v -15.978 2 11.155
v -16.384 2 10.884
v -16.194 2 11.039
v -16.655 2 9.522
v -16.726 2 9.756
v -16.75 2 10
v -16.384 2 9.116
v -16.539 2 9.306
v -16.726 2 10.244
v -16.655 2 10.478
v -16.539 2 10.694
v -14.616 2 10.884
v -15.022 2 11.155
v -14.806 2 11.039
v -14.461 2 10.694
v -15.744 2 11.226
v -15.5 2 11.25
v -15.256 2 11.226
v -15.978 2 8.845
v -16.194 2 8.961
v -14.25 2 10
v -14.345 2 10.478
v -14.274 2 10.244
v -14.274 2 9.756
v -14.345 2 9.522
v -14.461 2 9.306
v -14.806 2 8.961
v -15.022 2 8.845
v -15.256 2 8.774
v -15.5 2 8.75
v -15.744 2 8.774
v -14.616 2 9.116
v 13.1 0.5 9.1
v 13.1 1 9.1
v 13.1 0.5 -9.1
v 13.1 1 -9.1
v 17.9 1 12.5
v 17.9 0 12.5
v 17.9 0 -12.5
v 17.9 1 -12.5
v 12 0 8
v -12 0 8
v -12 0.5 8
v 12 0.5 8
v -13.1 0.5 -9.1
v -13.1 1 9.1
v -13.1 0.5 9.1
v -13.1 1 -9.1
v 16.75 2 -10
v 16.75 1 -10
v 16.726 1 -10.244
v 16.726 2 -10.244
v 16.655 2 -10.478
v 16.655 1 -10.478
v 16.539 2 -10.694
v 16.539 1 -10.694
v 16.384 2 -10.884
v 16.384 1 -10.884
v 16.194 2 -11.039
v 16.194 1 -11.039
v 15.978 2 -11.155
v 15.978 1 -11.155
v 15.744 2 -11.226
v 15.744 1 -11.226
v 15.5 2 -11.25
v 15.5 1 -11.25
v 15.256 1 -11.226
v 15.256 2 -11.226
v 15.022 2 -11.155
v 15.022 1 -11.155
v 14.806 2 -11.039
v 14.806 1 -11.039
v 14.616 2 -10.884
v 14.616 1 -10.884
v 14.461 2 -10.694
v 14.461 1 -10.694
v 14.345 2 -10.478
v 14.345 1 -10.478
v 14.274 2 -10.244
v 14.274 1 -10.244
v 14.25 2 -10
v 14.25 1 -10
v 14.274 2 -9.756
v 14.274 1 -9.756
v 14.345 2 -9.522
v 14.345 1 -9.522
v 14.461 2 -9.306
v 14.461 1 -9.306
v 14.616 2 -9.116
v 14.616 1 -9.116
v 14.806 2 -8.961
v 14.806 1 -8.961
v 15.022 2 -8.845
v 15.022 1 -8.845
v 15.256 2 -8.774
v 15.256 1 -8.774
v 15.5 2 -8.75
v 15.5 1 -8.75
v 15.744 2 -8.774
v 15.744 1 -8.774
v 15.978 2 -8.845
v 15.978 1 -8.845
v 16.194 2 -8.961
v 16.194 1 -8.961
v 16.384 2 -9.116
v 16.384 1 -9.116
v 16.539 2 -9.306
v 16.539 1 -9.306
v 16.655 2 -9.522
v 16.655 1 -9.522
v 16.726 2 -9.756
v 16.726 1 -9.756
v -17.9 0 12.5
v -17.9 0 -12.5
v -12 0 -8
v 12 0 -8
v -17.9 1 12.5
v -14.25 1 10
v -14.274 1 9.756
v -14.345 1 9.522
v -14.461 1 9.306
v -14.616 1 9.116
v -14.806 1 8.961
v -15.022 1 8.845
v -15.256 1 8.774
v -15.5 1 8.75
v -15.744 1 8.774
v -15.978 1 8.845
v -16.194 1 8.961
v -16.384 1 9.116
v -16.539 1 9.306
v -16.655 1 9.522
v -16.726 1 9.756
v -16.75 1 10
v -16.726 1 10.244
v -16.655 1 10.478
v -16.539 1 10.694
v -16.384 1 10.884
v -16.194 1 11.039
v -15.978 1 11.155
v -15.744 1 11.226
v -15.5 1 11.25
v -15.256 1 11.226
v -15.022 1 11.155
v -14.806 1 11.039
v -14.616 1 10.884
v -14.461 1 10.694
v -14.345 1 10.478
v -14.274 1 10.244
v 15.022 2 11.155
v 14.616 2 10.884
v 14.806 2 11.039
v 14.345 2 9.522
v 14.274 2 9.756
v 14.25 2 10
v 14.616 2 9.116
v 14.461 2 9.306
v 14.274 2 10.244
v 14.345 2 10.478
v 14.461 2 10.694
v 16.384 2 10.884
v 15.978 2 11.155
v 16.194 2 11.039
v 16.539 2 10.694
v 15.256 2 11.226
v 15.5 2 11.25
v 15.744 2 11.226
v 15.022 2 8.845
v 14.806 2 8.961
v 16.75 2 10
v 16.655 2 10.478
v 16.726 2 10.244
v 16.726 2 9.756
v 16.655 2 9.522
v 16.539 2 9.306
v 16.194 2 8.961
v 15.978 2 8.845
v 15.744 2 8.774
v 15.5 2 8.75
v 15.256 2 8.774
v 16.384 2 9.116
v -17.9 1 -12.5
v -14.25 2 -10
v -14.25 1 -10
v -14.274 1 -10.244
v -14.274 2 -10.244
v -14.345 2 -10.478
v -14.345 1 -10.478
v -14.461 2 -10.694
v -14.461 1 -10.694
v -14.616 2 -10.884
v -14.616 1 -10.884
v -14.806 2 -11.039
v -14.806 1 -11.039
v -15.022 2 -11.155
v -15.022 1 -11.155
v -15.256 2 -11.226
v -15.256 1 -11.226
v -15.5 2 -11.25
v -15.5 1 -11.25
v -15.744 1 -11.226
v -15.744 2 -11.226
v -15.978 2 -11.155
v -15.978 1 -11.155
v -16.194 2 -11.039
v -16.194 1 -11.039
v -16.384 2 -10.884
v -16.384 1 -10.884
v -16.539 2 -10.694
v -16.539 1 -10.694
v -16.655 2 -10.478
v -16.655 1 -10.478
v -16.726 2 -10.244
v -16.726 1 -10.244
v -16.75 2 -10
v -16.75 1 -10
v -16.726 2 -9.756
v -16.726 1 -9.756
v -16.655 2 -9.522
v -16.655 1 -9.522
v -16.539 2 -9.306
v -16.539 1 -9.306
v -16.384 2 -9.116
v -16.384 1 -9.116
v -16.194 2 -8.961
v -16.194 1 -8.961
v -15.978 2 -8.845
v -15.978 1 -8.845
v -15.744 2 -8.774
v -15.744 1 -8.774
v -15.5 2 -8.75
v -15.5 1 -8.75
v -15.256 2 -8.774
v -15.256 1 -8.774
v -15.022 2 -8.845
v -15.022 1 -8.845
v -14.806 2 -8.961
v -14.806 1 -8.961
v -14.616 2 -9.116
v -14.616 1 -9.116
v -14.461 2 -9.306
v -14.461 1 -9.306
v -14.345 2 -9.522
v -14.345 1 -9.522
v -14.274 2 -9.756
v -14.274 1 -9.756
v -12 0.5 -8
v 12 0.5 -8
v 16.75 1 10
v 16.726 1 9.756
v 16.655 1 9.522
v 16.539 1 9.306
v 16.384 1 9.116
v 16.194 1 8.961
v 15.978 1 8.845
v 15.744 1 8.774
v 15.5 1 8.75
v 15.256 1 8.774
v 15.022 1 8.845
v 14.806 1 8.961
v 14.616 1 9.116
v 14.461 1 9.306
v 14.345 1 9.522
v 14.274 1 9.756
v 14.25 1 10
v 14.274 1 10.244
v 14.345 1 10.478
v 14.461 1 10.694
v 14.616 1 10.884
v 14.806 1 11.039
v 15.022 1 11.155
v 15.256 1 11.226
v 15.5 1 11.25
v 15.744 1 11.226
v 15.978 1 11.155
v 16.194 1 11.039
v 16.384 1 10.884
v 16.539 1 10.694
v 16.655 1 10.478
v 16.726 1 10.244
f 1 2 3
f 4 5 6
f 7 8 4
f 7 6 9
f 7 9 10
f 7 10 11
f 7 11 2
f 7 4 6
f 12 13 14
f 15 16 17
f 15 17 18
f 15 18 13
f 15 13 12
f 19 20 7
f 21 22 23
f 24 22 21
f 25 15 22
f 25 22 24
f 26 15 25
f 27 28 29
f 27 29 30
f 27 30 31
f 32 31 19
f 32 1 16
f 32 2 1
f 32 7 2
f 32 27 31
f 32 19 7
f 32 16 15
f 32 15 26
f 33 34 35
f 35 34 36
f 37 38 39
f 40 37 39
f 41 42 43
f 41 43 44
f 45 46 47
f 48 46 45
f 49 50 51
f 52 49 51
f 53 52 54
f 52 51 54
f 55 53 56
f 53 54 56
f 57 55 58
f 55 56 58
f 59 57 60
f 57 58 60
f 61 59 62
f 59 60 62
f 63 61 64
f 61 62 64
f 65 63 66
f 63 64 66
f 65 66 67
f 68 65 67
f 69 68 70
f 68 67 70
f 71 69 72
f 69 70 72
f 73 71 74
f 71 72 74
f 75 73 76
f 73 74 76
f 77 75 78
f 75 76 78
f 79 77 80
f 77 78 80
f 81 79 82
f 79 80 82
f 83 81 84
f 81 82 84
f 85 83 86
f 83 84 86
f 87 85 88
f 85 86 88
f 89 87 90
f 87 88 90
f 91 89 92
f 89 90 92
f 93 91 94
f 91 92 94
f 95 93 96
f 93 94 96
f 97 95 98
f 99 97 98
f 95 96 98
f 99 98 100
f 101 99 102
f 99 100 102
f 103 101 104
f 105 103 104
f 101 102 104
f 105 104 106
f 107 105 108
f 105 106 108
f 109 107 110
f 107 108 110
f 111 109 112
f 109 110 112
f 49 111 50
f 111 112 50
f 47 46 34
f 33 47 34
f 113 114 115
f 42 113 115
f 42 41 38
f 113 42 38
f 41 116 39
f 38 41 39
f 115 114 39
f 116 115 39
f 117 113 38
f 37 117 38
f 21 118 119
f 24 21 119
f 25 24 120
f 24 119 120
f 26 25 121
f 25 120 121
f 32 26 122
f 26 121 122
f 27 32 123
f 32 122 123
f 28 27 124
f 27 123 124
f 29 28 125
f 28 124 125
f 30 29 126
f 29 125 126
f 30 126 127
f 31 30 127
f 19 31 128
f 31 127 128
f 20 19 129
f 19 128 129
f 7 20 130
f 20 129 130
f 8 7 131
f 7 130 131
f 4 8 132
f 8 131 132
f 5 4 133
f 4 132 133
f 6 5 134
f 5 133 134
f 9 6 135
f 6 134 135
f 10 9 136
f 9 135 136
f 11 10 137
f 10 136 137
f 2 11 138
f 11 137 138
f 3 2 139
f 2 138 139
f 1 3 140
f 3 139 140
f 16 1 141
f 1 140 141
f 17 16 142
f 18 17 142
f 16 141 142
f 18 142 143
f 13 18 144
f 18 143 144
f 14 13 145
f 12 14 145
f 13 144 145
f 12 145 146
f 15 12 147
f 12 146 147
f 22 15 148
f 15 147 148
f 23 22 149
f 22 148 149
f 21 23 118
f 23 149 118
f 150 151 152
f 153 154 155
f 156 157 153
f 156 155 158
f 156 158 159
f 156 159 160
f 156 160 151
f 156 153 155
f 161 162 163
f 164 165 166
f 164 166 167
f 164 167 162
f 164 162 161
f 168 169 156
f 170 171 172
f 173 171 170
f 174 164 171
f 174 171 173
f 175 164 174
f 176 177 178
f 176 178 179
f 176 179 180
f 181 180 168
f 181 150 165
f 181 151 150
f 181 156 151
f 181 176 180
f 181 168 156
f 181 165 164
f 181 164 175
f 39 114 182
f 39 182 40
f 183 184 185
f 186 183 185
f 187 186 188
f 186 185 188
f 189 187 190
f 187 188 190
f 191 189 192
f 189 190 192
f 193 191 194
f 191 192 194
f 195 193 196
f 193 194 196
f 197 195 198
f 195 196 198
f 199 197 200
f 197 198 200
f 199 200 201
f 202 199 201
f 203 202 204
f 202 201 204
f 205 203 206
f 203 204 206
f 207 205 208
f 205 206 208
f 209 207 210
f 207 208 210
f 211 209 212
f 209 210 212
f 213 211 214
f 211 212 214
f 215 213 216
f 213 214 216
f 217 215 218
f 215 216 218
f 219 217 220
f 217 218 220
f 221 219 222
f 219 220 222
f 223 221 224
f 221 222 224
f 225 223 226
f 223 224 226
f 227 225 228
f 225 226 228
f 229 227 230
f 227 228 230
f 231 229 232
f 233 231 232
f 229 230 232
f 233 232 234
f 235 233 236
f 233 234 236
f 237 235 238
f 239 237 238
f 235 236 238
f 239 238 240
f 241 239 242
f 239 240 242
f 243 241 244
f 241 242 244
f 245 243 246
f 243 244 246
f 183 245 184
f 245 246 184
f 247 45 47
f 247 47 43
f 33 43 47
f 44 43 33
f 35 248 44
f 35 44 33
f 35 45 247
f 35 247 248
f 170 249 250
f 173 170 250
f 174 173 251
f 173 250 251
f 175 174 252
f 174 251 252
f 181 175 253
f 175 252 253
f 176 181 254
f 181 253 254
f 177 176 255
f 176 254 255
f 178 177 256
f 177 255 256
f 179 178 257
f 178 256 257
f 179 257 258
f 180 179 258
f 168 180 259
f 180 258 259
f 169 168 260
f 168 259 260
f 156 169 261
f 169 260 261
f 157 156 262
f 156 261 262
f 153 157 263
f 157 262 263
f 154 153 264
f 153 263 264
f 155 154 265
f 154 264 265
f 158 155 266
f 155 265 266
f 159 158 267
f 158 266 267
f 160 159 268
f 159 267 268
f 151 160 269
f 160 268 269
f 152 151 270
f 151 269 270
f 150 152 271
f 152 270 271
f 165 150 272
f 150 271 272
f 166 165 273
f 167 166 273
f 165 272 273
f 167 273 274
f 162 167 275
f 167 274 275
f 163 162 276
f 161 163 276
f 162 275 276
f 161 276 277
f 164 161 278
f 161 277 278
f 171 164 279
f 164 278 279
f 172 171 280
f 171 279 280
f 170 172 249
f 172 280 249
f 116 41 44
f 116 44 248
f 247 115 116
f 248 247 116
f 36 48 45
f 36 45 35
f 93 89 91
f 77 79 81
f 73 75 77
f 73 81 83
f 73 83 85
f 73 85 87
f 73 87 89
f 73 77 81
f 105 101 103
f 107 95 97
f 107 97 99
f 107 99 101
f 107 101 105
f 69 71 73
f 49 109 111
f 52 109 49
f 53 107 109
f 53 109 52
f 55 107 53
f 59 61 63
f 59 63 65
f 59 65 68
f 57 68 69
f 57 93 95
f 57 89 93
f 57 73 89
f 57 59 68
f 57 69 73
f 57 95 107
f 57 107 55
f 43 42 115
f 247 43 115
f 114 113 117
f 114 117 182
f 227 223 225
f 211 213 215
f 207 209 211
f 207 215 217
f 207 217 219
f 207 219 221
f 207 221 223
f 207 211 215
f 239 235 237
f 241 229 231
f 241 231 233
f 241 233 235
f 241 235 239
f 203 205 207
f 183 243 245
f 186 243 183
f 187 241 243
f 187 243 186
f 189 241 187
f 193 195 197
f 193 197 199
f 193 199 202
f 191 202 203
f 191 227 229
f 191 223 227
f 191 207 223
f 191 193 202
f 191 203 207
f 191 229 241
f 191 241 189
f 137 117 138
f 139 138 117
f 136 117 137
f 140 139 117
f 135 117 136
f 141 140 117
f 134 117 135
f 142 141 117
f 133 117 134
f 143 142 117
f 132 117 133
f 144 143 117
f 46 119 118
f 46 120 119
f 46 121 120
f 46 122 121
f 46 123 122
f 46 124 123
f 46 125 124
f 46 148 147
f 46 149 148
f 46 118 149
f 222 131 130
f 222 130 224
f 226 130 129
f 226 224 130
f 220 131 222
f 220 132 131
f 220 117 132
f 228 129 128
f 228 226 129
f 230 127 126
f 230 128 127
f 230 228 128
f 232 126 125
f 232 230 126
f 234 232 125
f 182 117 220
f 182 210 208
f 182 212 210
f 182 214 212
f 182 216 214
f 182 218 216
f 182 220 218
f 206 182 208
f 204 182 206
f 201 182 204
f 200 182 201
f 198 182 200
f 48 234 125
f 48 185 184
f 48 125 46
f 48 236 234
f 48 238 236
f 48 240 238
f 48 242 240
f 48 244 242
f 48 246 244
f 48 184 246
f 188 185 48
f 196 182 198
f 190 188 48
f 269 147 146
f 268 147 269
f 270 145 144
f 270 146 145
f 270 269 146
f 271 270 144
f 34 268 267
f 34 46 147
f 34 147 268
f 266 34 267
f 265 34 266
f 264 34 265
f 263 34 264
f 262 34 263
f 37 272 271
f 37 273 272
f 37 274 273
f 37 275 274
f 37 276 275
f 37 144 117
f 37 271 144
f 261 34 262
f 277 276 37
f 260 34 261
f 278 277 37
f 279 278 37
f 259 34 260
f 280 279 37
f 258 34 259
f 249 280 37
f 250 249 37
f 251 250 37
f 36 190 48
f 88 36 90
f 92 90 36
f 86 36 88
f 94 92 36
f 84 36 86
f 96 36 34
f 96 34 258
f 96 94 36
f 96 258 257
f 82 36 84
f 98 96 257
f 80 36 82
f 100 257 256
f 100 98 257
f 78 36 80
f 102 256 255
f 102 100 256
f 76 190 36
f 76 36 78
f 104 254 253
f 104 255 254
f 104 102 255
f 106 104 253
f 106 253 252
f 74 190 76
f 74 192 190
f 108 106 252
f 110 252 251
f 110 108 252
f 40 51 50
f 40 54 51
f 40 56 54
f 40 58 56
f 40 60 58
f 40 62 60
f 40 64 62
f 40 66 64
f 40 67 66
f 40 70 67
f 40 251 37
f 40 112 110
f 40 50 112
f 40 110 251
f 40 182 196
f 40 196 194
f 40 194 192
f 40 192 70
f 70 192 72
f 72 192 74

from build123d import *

# Parameters (mm, degrees)
SKETCH1_W           = 35.8
SKETCH1_H           = 25
SKETCH1_W_2         = 24
SKETCH1_H_2         = 16
BOSS_EXTRUDE1_DEPTH = 1
SKETCH2_W           = 26.2
SKETCH2_H           = 18.2
CUT_EXTRUDE1_DEPTH  = 0.5
SKETCH4_R           = 1.25
BOSS_EXTRUDE2_DEPTH = 1


with BuildPart() as part:
    # Sketch1 → Boss-Extrude1 (new body)
    with BuildSketch(Plane(origin=(0, 0, 0), x_dir=(1, 0, 0), z_dir=(0, 1, 0))):
        Rectangle(SKETCH1_W, SKETCH1_H)
        Rectangle(SKETCH1_W_2, SKETCH1_H_2, mode=Mode.SUBTRACT)
    extrude(amount=BOSS_EXTRUDE1_DEPTH)

    # Sketch2 → Cut-Extrude1 (cut)
    with BuildSketch(Plane(origin=(0, 1, 0), x_dir=(1, 0, 0), z_dir=(0, 1, 0))):
        Rectangle(SKETCH2_W, SKETCH2_H)
    extrude(amount=-CUT_EXTRUDE1_DEPTH, mode=Mode.SUBTRACT)

    # Sketch4 → Boss-Extrude2 (add)
    with BuildSketch(Plane(origin=(0, 1, 0), x_dir=(1, 0, 0), z_dir=(0, 1, 0))):
        with Locations((-15.5, 10)):
            Circle(SKETCH4_R)
        with Locations((-15.5, -10)):
            Circle(SKETCH4_R)
        with Locations((15.5, -10)):
            Circle(SKETCH4_R)
        with Locations((15.5, 10)):
            Circle(SKETCH4_R)
    extrude(amount=BOSS_EXTRUDE2_DEPTH)


solid = part.part
